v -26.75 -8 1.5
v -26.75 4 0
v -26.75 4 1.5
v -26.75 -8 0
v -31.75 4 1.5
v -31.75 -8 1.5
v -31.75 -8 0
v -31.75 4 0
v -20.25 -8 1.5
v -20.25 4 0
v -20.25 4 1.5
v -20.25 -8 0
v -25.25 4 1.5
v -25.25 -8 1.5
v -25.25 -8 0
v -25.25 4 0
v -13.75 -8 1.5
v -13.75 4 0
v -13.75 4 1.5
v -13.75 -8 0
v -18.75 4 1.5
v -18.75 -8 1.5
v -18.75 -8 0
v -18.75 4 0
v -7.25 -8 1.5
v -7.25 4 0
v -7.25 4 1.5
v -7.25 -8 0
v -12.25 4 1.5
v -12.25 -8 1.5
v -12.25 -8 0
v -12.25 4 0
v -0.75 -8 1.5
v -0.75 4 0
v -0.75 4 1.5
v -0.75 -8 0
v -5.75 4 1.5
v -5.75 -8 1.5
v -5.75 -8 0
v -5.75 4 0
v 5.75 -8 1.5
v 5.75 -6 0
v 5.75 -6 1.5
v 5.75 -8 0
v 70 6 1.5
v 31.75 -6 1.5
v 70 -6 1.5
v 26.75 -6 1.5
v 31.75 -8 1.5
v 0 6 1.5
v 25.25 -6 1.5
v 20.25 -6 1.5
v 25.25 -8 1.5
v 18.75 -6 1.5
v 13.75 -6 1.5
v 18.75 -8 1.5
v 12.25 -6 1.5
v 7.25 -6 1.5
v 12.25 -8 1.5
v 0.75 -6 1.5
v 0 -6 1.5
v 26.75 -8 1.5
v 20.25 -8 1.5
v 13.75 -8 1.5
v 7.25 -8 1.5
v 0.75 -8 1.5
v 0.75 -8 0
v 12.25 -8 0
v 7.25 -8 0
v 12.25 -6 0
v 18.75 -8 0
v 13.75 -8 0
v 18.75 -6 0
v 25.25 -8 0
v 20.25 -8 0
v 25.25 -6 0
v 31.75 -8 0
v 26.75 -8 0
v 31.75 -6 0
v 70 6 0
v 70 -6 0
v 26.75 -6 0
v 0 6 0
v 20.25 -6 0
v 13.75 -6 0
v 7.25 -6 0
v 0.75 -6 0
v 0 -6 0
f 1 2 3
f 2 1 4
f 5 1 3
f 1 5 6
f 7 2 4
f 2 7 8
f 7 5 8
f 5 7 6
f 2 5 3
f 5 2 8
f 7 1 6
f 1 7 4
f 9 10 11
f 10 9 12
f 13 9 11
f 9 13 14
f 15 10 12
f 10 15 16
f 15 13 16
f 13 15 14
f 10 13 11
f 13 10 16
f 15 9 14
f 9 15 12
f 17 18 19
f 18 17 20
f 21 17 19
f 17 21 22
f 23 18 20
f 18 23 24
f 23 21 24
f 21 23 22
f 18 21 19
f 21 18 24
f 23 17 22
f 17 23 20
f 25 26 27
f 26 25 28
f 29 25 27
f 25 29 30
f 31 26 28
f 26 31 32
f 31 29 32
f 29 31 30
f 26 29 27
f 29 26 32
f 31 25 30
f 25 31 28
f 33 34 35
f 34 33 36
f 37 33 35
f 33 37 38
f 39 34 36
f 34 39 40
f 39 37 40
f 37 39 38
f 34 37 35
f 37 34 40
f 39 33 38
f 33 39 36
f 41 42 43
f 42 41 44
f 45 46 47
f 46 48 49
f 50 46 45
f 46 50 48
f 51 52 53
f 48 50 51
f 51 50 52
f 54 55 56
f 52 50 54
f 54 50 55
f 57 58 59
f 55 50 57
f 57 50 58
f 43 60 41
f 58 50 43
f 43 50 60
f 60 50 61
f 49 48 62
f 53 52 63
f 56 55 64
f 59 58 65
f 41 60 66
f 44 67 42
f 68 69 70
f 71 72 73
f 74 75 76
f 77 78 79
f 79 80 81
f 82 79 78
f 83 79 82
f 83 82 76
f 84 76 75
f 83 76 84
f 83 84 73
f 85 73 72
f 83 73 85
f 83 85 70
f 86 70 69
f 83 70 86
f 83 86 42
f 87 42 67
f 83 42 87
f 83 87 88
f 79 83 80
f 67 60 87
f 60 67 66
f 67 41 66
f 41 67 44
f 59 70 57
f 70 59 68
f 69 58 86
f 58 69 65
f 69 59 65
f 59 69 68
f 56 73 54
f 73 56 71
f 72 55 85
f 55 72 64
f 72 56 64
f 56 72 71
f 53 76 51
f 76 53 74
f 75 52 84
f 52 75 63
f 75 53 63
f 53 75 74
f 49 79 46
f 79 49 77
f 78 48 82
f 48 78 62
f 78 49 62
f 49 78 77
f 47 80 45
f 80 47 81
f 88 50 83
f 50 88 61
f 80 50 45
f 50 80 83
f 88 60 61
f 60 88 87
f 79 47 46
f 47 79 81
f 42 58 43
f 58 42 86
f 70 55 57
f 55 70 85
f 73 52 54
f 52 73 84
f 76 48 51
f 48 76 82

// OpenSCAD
// Dimensions for the 10-well agarose gel comb
// All dimensions are in millimetres (mm)

// Overall geometry
plate_thickness = 1.5;      // Thickness of the flat plate (Z)
spine_length = 70.0;       // Length of the spine (X)
spine_width = 12.0;        // Width of the spine (Y)
tooth_width = 5.0;         // Width of each tooth (X)
tooth_length = 12.0;       // Length of each tooth (Y)
tooth_gap = 1.5;           // Gap between neighbouring teeth (X)
tooth_offset = 2.0;        // Distance from spine edge to tooth start (Y)

// Derived dimensions
num_teeth = 10;            // Number of teeth
total_teeth_width = num_teeth * tooth_width + (num_teeth - 1) * tooth_gap;
spine_x_start = -spine_length / 2;
spine_y_start = -spine_width / 2;
tooth_y_start = -spine_width / 2 - tooth_offset;

// Render settings
$fn = 64;                  // High resolution for curved surfaces

// Main Assembly
module gel_comb() {
    union() {
        // 1. The Spine (Back Bar)
        translate([0, spine_y_start, 0])
            cube([spine_length, spine_width, plate_thickness]);

        // 2. The Teeth
        // Loop to create 10 teeth
        for (i = [0 : num_teeth - 1]) {
            // Calculate X position for this tooth
            // Center the row of teeth on the spine
            tooth_x_center = (i * (tooth_width + tooth_gap)) - (total_teeth_width / 2);
            
            translate([tooth_x_center, tooth_y_start, 0])
                cube([tooth_width, tooth_length, plate_thickness]);
        }
    }
}

// Render the part
gel_comb();
